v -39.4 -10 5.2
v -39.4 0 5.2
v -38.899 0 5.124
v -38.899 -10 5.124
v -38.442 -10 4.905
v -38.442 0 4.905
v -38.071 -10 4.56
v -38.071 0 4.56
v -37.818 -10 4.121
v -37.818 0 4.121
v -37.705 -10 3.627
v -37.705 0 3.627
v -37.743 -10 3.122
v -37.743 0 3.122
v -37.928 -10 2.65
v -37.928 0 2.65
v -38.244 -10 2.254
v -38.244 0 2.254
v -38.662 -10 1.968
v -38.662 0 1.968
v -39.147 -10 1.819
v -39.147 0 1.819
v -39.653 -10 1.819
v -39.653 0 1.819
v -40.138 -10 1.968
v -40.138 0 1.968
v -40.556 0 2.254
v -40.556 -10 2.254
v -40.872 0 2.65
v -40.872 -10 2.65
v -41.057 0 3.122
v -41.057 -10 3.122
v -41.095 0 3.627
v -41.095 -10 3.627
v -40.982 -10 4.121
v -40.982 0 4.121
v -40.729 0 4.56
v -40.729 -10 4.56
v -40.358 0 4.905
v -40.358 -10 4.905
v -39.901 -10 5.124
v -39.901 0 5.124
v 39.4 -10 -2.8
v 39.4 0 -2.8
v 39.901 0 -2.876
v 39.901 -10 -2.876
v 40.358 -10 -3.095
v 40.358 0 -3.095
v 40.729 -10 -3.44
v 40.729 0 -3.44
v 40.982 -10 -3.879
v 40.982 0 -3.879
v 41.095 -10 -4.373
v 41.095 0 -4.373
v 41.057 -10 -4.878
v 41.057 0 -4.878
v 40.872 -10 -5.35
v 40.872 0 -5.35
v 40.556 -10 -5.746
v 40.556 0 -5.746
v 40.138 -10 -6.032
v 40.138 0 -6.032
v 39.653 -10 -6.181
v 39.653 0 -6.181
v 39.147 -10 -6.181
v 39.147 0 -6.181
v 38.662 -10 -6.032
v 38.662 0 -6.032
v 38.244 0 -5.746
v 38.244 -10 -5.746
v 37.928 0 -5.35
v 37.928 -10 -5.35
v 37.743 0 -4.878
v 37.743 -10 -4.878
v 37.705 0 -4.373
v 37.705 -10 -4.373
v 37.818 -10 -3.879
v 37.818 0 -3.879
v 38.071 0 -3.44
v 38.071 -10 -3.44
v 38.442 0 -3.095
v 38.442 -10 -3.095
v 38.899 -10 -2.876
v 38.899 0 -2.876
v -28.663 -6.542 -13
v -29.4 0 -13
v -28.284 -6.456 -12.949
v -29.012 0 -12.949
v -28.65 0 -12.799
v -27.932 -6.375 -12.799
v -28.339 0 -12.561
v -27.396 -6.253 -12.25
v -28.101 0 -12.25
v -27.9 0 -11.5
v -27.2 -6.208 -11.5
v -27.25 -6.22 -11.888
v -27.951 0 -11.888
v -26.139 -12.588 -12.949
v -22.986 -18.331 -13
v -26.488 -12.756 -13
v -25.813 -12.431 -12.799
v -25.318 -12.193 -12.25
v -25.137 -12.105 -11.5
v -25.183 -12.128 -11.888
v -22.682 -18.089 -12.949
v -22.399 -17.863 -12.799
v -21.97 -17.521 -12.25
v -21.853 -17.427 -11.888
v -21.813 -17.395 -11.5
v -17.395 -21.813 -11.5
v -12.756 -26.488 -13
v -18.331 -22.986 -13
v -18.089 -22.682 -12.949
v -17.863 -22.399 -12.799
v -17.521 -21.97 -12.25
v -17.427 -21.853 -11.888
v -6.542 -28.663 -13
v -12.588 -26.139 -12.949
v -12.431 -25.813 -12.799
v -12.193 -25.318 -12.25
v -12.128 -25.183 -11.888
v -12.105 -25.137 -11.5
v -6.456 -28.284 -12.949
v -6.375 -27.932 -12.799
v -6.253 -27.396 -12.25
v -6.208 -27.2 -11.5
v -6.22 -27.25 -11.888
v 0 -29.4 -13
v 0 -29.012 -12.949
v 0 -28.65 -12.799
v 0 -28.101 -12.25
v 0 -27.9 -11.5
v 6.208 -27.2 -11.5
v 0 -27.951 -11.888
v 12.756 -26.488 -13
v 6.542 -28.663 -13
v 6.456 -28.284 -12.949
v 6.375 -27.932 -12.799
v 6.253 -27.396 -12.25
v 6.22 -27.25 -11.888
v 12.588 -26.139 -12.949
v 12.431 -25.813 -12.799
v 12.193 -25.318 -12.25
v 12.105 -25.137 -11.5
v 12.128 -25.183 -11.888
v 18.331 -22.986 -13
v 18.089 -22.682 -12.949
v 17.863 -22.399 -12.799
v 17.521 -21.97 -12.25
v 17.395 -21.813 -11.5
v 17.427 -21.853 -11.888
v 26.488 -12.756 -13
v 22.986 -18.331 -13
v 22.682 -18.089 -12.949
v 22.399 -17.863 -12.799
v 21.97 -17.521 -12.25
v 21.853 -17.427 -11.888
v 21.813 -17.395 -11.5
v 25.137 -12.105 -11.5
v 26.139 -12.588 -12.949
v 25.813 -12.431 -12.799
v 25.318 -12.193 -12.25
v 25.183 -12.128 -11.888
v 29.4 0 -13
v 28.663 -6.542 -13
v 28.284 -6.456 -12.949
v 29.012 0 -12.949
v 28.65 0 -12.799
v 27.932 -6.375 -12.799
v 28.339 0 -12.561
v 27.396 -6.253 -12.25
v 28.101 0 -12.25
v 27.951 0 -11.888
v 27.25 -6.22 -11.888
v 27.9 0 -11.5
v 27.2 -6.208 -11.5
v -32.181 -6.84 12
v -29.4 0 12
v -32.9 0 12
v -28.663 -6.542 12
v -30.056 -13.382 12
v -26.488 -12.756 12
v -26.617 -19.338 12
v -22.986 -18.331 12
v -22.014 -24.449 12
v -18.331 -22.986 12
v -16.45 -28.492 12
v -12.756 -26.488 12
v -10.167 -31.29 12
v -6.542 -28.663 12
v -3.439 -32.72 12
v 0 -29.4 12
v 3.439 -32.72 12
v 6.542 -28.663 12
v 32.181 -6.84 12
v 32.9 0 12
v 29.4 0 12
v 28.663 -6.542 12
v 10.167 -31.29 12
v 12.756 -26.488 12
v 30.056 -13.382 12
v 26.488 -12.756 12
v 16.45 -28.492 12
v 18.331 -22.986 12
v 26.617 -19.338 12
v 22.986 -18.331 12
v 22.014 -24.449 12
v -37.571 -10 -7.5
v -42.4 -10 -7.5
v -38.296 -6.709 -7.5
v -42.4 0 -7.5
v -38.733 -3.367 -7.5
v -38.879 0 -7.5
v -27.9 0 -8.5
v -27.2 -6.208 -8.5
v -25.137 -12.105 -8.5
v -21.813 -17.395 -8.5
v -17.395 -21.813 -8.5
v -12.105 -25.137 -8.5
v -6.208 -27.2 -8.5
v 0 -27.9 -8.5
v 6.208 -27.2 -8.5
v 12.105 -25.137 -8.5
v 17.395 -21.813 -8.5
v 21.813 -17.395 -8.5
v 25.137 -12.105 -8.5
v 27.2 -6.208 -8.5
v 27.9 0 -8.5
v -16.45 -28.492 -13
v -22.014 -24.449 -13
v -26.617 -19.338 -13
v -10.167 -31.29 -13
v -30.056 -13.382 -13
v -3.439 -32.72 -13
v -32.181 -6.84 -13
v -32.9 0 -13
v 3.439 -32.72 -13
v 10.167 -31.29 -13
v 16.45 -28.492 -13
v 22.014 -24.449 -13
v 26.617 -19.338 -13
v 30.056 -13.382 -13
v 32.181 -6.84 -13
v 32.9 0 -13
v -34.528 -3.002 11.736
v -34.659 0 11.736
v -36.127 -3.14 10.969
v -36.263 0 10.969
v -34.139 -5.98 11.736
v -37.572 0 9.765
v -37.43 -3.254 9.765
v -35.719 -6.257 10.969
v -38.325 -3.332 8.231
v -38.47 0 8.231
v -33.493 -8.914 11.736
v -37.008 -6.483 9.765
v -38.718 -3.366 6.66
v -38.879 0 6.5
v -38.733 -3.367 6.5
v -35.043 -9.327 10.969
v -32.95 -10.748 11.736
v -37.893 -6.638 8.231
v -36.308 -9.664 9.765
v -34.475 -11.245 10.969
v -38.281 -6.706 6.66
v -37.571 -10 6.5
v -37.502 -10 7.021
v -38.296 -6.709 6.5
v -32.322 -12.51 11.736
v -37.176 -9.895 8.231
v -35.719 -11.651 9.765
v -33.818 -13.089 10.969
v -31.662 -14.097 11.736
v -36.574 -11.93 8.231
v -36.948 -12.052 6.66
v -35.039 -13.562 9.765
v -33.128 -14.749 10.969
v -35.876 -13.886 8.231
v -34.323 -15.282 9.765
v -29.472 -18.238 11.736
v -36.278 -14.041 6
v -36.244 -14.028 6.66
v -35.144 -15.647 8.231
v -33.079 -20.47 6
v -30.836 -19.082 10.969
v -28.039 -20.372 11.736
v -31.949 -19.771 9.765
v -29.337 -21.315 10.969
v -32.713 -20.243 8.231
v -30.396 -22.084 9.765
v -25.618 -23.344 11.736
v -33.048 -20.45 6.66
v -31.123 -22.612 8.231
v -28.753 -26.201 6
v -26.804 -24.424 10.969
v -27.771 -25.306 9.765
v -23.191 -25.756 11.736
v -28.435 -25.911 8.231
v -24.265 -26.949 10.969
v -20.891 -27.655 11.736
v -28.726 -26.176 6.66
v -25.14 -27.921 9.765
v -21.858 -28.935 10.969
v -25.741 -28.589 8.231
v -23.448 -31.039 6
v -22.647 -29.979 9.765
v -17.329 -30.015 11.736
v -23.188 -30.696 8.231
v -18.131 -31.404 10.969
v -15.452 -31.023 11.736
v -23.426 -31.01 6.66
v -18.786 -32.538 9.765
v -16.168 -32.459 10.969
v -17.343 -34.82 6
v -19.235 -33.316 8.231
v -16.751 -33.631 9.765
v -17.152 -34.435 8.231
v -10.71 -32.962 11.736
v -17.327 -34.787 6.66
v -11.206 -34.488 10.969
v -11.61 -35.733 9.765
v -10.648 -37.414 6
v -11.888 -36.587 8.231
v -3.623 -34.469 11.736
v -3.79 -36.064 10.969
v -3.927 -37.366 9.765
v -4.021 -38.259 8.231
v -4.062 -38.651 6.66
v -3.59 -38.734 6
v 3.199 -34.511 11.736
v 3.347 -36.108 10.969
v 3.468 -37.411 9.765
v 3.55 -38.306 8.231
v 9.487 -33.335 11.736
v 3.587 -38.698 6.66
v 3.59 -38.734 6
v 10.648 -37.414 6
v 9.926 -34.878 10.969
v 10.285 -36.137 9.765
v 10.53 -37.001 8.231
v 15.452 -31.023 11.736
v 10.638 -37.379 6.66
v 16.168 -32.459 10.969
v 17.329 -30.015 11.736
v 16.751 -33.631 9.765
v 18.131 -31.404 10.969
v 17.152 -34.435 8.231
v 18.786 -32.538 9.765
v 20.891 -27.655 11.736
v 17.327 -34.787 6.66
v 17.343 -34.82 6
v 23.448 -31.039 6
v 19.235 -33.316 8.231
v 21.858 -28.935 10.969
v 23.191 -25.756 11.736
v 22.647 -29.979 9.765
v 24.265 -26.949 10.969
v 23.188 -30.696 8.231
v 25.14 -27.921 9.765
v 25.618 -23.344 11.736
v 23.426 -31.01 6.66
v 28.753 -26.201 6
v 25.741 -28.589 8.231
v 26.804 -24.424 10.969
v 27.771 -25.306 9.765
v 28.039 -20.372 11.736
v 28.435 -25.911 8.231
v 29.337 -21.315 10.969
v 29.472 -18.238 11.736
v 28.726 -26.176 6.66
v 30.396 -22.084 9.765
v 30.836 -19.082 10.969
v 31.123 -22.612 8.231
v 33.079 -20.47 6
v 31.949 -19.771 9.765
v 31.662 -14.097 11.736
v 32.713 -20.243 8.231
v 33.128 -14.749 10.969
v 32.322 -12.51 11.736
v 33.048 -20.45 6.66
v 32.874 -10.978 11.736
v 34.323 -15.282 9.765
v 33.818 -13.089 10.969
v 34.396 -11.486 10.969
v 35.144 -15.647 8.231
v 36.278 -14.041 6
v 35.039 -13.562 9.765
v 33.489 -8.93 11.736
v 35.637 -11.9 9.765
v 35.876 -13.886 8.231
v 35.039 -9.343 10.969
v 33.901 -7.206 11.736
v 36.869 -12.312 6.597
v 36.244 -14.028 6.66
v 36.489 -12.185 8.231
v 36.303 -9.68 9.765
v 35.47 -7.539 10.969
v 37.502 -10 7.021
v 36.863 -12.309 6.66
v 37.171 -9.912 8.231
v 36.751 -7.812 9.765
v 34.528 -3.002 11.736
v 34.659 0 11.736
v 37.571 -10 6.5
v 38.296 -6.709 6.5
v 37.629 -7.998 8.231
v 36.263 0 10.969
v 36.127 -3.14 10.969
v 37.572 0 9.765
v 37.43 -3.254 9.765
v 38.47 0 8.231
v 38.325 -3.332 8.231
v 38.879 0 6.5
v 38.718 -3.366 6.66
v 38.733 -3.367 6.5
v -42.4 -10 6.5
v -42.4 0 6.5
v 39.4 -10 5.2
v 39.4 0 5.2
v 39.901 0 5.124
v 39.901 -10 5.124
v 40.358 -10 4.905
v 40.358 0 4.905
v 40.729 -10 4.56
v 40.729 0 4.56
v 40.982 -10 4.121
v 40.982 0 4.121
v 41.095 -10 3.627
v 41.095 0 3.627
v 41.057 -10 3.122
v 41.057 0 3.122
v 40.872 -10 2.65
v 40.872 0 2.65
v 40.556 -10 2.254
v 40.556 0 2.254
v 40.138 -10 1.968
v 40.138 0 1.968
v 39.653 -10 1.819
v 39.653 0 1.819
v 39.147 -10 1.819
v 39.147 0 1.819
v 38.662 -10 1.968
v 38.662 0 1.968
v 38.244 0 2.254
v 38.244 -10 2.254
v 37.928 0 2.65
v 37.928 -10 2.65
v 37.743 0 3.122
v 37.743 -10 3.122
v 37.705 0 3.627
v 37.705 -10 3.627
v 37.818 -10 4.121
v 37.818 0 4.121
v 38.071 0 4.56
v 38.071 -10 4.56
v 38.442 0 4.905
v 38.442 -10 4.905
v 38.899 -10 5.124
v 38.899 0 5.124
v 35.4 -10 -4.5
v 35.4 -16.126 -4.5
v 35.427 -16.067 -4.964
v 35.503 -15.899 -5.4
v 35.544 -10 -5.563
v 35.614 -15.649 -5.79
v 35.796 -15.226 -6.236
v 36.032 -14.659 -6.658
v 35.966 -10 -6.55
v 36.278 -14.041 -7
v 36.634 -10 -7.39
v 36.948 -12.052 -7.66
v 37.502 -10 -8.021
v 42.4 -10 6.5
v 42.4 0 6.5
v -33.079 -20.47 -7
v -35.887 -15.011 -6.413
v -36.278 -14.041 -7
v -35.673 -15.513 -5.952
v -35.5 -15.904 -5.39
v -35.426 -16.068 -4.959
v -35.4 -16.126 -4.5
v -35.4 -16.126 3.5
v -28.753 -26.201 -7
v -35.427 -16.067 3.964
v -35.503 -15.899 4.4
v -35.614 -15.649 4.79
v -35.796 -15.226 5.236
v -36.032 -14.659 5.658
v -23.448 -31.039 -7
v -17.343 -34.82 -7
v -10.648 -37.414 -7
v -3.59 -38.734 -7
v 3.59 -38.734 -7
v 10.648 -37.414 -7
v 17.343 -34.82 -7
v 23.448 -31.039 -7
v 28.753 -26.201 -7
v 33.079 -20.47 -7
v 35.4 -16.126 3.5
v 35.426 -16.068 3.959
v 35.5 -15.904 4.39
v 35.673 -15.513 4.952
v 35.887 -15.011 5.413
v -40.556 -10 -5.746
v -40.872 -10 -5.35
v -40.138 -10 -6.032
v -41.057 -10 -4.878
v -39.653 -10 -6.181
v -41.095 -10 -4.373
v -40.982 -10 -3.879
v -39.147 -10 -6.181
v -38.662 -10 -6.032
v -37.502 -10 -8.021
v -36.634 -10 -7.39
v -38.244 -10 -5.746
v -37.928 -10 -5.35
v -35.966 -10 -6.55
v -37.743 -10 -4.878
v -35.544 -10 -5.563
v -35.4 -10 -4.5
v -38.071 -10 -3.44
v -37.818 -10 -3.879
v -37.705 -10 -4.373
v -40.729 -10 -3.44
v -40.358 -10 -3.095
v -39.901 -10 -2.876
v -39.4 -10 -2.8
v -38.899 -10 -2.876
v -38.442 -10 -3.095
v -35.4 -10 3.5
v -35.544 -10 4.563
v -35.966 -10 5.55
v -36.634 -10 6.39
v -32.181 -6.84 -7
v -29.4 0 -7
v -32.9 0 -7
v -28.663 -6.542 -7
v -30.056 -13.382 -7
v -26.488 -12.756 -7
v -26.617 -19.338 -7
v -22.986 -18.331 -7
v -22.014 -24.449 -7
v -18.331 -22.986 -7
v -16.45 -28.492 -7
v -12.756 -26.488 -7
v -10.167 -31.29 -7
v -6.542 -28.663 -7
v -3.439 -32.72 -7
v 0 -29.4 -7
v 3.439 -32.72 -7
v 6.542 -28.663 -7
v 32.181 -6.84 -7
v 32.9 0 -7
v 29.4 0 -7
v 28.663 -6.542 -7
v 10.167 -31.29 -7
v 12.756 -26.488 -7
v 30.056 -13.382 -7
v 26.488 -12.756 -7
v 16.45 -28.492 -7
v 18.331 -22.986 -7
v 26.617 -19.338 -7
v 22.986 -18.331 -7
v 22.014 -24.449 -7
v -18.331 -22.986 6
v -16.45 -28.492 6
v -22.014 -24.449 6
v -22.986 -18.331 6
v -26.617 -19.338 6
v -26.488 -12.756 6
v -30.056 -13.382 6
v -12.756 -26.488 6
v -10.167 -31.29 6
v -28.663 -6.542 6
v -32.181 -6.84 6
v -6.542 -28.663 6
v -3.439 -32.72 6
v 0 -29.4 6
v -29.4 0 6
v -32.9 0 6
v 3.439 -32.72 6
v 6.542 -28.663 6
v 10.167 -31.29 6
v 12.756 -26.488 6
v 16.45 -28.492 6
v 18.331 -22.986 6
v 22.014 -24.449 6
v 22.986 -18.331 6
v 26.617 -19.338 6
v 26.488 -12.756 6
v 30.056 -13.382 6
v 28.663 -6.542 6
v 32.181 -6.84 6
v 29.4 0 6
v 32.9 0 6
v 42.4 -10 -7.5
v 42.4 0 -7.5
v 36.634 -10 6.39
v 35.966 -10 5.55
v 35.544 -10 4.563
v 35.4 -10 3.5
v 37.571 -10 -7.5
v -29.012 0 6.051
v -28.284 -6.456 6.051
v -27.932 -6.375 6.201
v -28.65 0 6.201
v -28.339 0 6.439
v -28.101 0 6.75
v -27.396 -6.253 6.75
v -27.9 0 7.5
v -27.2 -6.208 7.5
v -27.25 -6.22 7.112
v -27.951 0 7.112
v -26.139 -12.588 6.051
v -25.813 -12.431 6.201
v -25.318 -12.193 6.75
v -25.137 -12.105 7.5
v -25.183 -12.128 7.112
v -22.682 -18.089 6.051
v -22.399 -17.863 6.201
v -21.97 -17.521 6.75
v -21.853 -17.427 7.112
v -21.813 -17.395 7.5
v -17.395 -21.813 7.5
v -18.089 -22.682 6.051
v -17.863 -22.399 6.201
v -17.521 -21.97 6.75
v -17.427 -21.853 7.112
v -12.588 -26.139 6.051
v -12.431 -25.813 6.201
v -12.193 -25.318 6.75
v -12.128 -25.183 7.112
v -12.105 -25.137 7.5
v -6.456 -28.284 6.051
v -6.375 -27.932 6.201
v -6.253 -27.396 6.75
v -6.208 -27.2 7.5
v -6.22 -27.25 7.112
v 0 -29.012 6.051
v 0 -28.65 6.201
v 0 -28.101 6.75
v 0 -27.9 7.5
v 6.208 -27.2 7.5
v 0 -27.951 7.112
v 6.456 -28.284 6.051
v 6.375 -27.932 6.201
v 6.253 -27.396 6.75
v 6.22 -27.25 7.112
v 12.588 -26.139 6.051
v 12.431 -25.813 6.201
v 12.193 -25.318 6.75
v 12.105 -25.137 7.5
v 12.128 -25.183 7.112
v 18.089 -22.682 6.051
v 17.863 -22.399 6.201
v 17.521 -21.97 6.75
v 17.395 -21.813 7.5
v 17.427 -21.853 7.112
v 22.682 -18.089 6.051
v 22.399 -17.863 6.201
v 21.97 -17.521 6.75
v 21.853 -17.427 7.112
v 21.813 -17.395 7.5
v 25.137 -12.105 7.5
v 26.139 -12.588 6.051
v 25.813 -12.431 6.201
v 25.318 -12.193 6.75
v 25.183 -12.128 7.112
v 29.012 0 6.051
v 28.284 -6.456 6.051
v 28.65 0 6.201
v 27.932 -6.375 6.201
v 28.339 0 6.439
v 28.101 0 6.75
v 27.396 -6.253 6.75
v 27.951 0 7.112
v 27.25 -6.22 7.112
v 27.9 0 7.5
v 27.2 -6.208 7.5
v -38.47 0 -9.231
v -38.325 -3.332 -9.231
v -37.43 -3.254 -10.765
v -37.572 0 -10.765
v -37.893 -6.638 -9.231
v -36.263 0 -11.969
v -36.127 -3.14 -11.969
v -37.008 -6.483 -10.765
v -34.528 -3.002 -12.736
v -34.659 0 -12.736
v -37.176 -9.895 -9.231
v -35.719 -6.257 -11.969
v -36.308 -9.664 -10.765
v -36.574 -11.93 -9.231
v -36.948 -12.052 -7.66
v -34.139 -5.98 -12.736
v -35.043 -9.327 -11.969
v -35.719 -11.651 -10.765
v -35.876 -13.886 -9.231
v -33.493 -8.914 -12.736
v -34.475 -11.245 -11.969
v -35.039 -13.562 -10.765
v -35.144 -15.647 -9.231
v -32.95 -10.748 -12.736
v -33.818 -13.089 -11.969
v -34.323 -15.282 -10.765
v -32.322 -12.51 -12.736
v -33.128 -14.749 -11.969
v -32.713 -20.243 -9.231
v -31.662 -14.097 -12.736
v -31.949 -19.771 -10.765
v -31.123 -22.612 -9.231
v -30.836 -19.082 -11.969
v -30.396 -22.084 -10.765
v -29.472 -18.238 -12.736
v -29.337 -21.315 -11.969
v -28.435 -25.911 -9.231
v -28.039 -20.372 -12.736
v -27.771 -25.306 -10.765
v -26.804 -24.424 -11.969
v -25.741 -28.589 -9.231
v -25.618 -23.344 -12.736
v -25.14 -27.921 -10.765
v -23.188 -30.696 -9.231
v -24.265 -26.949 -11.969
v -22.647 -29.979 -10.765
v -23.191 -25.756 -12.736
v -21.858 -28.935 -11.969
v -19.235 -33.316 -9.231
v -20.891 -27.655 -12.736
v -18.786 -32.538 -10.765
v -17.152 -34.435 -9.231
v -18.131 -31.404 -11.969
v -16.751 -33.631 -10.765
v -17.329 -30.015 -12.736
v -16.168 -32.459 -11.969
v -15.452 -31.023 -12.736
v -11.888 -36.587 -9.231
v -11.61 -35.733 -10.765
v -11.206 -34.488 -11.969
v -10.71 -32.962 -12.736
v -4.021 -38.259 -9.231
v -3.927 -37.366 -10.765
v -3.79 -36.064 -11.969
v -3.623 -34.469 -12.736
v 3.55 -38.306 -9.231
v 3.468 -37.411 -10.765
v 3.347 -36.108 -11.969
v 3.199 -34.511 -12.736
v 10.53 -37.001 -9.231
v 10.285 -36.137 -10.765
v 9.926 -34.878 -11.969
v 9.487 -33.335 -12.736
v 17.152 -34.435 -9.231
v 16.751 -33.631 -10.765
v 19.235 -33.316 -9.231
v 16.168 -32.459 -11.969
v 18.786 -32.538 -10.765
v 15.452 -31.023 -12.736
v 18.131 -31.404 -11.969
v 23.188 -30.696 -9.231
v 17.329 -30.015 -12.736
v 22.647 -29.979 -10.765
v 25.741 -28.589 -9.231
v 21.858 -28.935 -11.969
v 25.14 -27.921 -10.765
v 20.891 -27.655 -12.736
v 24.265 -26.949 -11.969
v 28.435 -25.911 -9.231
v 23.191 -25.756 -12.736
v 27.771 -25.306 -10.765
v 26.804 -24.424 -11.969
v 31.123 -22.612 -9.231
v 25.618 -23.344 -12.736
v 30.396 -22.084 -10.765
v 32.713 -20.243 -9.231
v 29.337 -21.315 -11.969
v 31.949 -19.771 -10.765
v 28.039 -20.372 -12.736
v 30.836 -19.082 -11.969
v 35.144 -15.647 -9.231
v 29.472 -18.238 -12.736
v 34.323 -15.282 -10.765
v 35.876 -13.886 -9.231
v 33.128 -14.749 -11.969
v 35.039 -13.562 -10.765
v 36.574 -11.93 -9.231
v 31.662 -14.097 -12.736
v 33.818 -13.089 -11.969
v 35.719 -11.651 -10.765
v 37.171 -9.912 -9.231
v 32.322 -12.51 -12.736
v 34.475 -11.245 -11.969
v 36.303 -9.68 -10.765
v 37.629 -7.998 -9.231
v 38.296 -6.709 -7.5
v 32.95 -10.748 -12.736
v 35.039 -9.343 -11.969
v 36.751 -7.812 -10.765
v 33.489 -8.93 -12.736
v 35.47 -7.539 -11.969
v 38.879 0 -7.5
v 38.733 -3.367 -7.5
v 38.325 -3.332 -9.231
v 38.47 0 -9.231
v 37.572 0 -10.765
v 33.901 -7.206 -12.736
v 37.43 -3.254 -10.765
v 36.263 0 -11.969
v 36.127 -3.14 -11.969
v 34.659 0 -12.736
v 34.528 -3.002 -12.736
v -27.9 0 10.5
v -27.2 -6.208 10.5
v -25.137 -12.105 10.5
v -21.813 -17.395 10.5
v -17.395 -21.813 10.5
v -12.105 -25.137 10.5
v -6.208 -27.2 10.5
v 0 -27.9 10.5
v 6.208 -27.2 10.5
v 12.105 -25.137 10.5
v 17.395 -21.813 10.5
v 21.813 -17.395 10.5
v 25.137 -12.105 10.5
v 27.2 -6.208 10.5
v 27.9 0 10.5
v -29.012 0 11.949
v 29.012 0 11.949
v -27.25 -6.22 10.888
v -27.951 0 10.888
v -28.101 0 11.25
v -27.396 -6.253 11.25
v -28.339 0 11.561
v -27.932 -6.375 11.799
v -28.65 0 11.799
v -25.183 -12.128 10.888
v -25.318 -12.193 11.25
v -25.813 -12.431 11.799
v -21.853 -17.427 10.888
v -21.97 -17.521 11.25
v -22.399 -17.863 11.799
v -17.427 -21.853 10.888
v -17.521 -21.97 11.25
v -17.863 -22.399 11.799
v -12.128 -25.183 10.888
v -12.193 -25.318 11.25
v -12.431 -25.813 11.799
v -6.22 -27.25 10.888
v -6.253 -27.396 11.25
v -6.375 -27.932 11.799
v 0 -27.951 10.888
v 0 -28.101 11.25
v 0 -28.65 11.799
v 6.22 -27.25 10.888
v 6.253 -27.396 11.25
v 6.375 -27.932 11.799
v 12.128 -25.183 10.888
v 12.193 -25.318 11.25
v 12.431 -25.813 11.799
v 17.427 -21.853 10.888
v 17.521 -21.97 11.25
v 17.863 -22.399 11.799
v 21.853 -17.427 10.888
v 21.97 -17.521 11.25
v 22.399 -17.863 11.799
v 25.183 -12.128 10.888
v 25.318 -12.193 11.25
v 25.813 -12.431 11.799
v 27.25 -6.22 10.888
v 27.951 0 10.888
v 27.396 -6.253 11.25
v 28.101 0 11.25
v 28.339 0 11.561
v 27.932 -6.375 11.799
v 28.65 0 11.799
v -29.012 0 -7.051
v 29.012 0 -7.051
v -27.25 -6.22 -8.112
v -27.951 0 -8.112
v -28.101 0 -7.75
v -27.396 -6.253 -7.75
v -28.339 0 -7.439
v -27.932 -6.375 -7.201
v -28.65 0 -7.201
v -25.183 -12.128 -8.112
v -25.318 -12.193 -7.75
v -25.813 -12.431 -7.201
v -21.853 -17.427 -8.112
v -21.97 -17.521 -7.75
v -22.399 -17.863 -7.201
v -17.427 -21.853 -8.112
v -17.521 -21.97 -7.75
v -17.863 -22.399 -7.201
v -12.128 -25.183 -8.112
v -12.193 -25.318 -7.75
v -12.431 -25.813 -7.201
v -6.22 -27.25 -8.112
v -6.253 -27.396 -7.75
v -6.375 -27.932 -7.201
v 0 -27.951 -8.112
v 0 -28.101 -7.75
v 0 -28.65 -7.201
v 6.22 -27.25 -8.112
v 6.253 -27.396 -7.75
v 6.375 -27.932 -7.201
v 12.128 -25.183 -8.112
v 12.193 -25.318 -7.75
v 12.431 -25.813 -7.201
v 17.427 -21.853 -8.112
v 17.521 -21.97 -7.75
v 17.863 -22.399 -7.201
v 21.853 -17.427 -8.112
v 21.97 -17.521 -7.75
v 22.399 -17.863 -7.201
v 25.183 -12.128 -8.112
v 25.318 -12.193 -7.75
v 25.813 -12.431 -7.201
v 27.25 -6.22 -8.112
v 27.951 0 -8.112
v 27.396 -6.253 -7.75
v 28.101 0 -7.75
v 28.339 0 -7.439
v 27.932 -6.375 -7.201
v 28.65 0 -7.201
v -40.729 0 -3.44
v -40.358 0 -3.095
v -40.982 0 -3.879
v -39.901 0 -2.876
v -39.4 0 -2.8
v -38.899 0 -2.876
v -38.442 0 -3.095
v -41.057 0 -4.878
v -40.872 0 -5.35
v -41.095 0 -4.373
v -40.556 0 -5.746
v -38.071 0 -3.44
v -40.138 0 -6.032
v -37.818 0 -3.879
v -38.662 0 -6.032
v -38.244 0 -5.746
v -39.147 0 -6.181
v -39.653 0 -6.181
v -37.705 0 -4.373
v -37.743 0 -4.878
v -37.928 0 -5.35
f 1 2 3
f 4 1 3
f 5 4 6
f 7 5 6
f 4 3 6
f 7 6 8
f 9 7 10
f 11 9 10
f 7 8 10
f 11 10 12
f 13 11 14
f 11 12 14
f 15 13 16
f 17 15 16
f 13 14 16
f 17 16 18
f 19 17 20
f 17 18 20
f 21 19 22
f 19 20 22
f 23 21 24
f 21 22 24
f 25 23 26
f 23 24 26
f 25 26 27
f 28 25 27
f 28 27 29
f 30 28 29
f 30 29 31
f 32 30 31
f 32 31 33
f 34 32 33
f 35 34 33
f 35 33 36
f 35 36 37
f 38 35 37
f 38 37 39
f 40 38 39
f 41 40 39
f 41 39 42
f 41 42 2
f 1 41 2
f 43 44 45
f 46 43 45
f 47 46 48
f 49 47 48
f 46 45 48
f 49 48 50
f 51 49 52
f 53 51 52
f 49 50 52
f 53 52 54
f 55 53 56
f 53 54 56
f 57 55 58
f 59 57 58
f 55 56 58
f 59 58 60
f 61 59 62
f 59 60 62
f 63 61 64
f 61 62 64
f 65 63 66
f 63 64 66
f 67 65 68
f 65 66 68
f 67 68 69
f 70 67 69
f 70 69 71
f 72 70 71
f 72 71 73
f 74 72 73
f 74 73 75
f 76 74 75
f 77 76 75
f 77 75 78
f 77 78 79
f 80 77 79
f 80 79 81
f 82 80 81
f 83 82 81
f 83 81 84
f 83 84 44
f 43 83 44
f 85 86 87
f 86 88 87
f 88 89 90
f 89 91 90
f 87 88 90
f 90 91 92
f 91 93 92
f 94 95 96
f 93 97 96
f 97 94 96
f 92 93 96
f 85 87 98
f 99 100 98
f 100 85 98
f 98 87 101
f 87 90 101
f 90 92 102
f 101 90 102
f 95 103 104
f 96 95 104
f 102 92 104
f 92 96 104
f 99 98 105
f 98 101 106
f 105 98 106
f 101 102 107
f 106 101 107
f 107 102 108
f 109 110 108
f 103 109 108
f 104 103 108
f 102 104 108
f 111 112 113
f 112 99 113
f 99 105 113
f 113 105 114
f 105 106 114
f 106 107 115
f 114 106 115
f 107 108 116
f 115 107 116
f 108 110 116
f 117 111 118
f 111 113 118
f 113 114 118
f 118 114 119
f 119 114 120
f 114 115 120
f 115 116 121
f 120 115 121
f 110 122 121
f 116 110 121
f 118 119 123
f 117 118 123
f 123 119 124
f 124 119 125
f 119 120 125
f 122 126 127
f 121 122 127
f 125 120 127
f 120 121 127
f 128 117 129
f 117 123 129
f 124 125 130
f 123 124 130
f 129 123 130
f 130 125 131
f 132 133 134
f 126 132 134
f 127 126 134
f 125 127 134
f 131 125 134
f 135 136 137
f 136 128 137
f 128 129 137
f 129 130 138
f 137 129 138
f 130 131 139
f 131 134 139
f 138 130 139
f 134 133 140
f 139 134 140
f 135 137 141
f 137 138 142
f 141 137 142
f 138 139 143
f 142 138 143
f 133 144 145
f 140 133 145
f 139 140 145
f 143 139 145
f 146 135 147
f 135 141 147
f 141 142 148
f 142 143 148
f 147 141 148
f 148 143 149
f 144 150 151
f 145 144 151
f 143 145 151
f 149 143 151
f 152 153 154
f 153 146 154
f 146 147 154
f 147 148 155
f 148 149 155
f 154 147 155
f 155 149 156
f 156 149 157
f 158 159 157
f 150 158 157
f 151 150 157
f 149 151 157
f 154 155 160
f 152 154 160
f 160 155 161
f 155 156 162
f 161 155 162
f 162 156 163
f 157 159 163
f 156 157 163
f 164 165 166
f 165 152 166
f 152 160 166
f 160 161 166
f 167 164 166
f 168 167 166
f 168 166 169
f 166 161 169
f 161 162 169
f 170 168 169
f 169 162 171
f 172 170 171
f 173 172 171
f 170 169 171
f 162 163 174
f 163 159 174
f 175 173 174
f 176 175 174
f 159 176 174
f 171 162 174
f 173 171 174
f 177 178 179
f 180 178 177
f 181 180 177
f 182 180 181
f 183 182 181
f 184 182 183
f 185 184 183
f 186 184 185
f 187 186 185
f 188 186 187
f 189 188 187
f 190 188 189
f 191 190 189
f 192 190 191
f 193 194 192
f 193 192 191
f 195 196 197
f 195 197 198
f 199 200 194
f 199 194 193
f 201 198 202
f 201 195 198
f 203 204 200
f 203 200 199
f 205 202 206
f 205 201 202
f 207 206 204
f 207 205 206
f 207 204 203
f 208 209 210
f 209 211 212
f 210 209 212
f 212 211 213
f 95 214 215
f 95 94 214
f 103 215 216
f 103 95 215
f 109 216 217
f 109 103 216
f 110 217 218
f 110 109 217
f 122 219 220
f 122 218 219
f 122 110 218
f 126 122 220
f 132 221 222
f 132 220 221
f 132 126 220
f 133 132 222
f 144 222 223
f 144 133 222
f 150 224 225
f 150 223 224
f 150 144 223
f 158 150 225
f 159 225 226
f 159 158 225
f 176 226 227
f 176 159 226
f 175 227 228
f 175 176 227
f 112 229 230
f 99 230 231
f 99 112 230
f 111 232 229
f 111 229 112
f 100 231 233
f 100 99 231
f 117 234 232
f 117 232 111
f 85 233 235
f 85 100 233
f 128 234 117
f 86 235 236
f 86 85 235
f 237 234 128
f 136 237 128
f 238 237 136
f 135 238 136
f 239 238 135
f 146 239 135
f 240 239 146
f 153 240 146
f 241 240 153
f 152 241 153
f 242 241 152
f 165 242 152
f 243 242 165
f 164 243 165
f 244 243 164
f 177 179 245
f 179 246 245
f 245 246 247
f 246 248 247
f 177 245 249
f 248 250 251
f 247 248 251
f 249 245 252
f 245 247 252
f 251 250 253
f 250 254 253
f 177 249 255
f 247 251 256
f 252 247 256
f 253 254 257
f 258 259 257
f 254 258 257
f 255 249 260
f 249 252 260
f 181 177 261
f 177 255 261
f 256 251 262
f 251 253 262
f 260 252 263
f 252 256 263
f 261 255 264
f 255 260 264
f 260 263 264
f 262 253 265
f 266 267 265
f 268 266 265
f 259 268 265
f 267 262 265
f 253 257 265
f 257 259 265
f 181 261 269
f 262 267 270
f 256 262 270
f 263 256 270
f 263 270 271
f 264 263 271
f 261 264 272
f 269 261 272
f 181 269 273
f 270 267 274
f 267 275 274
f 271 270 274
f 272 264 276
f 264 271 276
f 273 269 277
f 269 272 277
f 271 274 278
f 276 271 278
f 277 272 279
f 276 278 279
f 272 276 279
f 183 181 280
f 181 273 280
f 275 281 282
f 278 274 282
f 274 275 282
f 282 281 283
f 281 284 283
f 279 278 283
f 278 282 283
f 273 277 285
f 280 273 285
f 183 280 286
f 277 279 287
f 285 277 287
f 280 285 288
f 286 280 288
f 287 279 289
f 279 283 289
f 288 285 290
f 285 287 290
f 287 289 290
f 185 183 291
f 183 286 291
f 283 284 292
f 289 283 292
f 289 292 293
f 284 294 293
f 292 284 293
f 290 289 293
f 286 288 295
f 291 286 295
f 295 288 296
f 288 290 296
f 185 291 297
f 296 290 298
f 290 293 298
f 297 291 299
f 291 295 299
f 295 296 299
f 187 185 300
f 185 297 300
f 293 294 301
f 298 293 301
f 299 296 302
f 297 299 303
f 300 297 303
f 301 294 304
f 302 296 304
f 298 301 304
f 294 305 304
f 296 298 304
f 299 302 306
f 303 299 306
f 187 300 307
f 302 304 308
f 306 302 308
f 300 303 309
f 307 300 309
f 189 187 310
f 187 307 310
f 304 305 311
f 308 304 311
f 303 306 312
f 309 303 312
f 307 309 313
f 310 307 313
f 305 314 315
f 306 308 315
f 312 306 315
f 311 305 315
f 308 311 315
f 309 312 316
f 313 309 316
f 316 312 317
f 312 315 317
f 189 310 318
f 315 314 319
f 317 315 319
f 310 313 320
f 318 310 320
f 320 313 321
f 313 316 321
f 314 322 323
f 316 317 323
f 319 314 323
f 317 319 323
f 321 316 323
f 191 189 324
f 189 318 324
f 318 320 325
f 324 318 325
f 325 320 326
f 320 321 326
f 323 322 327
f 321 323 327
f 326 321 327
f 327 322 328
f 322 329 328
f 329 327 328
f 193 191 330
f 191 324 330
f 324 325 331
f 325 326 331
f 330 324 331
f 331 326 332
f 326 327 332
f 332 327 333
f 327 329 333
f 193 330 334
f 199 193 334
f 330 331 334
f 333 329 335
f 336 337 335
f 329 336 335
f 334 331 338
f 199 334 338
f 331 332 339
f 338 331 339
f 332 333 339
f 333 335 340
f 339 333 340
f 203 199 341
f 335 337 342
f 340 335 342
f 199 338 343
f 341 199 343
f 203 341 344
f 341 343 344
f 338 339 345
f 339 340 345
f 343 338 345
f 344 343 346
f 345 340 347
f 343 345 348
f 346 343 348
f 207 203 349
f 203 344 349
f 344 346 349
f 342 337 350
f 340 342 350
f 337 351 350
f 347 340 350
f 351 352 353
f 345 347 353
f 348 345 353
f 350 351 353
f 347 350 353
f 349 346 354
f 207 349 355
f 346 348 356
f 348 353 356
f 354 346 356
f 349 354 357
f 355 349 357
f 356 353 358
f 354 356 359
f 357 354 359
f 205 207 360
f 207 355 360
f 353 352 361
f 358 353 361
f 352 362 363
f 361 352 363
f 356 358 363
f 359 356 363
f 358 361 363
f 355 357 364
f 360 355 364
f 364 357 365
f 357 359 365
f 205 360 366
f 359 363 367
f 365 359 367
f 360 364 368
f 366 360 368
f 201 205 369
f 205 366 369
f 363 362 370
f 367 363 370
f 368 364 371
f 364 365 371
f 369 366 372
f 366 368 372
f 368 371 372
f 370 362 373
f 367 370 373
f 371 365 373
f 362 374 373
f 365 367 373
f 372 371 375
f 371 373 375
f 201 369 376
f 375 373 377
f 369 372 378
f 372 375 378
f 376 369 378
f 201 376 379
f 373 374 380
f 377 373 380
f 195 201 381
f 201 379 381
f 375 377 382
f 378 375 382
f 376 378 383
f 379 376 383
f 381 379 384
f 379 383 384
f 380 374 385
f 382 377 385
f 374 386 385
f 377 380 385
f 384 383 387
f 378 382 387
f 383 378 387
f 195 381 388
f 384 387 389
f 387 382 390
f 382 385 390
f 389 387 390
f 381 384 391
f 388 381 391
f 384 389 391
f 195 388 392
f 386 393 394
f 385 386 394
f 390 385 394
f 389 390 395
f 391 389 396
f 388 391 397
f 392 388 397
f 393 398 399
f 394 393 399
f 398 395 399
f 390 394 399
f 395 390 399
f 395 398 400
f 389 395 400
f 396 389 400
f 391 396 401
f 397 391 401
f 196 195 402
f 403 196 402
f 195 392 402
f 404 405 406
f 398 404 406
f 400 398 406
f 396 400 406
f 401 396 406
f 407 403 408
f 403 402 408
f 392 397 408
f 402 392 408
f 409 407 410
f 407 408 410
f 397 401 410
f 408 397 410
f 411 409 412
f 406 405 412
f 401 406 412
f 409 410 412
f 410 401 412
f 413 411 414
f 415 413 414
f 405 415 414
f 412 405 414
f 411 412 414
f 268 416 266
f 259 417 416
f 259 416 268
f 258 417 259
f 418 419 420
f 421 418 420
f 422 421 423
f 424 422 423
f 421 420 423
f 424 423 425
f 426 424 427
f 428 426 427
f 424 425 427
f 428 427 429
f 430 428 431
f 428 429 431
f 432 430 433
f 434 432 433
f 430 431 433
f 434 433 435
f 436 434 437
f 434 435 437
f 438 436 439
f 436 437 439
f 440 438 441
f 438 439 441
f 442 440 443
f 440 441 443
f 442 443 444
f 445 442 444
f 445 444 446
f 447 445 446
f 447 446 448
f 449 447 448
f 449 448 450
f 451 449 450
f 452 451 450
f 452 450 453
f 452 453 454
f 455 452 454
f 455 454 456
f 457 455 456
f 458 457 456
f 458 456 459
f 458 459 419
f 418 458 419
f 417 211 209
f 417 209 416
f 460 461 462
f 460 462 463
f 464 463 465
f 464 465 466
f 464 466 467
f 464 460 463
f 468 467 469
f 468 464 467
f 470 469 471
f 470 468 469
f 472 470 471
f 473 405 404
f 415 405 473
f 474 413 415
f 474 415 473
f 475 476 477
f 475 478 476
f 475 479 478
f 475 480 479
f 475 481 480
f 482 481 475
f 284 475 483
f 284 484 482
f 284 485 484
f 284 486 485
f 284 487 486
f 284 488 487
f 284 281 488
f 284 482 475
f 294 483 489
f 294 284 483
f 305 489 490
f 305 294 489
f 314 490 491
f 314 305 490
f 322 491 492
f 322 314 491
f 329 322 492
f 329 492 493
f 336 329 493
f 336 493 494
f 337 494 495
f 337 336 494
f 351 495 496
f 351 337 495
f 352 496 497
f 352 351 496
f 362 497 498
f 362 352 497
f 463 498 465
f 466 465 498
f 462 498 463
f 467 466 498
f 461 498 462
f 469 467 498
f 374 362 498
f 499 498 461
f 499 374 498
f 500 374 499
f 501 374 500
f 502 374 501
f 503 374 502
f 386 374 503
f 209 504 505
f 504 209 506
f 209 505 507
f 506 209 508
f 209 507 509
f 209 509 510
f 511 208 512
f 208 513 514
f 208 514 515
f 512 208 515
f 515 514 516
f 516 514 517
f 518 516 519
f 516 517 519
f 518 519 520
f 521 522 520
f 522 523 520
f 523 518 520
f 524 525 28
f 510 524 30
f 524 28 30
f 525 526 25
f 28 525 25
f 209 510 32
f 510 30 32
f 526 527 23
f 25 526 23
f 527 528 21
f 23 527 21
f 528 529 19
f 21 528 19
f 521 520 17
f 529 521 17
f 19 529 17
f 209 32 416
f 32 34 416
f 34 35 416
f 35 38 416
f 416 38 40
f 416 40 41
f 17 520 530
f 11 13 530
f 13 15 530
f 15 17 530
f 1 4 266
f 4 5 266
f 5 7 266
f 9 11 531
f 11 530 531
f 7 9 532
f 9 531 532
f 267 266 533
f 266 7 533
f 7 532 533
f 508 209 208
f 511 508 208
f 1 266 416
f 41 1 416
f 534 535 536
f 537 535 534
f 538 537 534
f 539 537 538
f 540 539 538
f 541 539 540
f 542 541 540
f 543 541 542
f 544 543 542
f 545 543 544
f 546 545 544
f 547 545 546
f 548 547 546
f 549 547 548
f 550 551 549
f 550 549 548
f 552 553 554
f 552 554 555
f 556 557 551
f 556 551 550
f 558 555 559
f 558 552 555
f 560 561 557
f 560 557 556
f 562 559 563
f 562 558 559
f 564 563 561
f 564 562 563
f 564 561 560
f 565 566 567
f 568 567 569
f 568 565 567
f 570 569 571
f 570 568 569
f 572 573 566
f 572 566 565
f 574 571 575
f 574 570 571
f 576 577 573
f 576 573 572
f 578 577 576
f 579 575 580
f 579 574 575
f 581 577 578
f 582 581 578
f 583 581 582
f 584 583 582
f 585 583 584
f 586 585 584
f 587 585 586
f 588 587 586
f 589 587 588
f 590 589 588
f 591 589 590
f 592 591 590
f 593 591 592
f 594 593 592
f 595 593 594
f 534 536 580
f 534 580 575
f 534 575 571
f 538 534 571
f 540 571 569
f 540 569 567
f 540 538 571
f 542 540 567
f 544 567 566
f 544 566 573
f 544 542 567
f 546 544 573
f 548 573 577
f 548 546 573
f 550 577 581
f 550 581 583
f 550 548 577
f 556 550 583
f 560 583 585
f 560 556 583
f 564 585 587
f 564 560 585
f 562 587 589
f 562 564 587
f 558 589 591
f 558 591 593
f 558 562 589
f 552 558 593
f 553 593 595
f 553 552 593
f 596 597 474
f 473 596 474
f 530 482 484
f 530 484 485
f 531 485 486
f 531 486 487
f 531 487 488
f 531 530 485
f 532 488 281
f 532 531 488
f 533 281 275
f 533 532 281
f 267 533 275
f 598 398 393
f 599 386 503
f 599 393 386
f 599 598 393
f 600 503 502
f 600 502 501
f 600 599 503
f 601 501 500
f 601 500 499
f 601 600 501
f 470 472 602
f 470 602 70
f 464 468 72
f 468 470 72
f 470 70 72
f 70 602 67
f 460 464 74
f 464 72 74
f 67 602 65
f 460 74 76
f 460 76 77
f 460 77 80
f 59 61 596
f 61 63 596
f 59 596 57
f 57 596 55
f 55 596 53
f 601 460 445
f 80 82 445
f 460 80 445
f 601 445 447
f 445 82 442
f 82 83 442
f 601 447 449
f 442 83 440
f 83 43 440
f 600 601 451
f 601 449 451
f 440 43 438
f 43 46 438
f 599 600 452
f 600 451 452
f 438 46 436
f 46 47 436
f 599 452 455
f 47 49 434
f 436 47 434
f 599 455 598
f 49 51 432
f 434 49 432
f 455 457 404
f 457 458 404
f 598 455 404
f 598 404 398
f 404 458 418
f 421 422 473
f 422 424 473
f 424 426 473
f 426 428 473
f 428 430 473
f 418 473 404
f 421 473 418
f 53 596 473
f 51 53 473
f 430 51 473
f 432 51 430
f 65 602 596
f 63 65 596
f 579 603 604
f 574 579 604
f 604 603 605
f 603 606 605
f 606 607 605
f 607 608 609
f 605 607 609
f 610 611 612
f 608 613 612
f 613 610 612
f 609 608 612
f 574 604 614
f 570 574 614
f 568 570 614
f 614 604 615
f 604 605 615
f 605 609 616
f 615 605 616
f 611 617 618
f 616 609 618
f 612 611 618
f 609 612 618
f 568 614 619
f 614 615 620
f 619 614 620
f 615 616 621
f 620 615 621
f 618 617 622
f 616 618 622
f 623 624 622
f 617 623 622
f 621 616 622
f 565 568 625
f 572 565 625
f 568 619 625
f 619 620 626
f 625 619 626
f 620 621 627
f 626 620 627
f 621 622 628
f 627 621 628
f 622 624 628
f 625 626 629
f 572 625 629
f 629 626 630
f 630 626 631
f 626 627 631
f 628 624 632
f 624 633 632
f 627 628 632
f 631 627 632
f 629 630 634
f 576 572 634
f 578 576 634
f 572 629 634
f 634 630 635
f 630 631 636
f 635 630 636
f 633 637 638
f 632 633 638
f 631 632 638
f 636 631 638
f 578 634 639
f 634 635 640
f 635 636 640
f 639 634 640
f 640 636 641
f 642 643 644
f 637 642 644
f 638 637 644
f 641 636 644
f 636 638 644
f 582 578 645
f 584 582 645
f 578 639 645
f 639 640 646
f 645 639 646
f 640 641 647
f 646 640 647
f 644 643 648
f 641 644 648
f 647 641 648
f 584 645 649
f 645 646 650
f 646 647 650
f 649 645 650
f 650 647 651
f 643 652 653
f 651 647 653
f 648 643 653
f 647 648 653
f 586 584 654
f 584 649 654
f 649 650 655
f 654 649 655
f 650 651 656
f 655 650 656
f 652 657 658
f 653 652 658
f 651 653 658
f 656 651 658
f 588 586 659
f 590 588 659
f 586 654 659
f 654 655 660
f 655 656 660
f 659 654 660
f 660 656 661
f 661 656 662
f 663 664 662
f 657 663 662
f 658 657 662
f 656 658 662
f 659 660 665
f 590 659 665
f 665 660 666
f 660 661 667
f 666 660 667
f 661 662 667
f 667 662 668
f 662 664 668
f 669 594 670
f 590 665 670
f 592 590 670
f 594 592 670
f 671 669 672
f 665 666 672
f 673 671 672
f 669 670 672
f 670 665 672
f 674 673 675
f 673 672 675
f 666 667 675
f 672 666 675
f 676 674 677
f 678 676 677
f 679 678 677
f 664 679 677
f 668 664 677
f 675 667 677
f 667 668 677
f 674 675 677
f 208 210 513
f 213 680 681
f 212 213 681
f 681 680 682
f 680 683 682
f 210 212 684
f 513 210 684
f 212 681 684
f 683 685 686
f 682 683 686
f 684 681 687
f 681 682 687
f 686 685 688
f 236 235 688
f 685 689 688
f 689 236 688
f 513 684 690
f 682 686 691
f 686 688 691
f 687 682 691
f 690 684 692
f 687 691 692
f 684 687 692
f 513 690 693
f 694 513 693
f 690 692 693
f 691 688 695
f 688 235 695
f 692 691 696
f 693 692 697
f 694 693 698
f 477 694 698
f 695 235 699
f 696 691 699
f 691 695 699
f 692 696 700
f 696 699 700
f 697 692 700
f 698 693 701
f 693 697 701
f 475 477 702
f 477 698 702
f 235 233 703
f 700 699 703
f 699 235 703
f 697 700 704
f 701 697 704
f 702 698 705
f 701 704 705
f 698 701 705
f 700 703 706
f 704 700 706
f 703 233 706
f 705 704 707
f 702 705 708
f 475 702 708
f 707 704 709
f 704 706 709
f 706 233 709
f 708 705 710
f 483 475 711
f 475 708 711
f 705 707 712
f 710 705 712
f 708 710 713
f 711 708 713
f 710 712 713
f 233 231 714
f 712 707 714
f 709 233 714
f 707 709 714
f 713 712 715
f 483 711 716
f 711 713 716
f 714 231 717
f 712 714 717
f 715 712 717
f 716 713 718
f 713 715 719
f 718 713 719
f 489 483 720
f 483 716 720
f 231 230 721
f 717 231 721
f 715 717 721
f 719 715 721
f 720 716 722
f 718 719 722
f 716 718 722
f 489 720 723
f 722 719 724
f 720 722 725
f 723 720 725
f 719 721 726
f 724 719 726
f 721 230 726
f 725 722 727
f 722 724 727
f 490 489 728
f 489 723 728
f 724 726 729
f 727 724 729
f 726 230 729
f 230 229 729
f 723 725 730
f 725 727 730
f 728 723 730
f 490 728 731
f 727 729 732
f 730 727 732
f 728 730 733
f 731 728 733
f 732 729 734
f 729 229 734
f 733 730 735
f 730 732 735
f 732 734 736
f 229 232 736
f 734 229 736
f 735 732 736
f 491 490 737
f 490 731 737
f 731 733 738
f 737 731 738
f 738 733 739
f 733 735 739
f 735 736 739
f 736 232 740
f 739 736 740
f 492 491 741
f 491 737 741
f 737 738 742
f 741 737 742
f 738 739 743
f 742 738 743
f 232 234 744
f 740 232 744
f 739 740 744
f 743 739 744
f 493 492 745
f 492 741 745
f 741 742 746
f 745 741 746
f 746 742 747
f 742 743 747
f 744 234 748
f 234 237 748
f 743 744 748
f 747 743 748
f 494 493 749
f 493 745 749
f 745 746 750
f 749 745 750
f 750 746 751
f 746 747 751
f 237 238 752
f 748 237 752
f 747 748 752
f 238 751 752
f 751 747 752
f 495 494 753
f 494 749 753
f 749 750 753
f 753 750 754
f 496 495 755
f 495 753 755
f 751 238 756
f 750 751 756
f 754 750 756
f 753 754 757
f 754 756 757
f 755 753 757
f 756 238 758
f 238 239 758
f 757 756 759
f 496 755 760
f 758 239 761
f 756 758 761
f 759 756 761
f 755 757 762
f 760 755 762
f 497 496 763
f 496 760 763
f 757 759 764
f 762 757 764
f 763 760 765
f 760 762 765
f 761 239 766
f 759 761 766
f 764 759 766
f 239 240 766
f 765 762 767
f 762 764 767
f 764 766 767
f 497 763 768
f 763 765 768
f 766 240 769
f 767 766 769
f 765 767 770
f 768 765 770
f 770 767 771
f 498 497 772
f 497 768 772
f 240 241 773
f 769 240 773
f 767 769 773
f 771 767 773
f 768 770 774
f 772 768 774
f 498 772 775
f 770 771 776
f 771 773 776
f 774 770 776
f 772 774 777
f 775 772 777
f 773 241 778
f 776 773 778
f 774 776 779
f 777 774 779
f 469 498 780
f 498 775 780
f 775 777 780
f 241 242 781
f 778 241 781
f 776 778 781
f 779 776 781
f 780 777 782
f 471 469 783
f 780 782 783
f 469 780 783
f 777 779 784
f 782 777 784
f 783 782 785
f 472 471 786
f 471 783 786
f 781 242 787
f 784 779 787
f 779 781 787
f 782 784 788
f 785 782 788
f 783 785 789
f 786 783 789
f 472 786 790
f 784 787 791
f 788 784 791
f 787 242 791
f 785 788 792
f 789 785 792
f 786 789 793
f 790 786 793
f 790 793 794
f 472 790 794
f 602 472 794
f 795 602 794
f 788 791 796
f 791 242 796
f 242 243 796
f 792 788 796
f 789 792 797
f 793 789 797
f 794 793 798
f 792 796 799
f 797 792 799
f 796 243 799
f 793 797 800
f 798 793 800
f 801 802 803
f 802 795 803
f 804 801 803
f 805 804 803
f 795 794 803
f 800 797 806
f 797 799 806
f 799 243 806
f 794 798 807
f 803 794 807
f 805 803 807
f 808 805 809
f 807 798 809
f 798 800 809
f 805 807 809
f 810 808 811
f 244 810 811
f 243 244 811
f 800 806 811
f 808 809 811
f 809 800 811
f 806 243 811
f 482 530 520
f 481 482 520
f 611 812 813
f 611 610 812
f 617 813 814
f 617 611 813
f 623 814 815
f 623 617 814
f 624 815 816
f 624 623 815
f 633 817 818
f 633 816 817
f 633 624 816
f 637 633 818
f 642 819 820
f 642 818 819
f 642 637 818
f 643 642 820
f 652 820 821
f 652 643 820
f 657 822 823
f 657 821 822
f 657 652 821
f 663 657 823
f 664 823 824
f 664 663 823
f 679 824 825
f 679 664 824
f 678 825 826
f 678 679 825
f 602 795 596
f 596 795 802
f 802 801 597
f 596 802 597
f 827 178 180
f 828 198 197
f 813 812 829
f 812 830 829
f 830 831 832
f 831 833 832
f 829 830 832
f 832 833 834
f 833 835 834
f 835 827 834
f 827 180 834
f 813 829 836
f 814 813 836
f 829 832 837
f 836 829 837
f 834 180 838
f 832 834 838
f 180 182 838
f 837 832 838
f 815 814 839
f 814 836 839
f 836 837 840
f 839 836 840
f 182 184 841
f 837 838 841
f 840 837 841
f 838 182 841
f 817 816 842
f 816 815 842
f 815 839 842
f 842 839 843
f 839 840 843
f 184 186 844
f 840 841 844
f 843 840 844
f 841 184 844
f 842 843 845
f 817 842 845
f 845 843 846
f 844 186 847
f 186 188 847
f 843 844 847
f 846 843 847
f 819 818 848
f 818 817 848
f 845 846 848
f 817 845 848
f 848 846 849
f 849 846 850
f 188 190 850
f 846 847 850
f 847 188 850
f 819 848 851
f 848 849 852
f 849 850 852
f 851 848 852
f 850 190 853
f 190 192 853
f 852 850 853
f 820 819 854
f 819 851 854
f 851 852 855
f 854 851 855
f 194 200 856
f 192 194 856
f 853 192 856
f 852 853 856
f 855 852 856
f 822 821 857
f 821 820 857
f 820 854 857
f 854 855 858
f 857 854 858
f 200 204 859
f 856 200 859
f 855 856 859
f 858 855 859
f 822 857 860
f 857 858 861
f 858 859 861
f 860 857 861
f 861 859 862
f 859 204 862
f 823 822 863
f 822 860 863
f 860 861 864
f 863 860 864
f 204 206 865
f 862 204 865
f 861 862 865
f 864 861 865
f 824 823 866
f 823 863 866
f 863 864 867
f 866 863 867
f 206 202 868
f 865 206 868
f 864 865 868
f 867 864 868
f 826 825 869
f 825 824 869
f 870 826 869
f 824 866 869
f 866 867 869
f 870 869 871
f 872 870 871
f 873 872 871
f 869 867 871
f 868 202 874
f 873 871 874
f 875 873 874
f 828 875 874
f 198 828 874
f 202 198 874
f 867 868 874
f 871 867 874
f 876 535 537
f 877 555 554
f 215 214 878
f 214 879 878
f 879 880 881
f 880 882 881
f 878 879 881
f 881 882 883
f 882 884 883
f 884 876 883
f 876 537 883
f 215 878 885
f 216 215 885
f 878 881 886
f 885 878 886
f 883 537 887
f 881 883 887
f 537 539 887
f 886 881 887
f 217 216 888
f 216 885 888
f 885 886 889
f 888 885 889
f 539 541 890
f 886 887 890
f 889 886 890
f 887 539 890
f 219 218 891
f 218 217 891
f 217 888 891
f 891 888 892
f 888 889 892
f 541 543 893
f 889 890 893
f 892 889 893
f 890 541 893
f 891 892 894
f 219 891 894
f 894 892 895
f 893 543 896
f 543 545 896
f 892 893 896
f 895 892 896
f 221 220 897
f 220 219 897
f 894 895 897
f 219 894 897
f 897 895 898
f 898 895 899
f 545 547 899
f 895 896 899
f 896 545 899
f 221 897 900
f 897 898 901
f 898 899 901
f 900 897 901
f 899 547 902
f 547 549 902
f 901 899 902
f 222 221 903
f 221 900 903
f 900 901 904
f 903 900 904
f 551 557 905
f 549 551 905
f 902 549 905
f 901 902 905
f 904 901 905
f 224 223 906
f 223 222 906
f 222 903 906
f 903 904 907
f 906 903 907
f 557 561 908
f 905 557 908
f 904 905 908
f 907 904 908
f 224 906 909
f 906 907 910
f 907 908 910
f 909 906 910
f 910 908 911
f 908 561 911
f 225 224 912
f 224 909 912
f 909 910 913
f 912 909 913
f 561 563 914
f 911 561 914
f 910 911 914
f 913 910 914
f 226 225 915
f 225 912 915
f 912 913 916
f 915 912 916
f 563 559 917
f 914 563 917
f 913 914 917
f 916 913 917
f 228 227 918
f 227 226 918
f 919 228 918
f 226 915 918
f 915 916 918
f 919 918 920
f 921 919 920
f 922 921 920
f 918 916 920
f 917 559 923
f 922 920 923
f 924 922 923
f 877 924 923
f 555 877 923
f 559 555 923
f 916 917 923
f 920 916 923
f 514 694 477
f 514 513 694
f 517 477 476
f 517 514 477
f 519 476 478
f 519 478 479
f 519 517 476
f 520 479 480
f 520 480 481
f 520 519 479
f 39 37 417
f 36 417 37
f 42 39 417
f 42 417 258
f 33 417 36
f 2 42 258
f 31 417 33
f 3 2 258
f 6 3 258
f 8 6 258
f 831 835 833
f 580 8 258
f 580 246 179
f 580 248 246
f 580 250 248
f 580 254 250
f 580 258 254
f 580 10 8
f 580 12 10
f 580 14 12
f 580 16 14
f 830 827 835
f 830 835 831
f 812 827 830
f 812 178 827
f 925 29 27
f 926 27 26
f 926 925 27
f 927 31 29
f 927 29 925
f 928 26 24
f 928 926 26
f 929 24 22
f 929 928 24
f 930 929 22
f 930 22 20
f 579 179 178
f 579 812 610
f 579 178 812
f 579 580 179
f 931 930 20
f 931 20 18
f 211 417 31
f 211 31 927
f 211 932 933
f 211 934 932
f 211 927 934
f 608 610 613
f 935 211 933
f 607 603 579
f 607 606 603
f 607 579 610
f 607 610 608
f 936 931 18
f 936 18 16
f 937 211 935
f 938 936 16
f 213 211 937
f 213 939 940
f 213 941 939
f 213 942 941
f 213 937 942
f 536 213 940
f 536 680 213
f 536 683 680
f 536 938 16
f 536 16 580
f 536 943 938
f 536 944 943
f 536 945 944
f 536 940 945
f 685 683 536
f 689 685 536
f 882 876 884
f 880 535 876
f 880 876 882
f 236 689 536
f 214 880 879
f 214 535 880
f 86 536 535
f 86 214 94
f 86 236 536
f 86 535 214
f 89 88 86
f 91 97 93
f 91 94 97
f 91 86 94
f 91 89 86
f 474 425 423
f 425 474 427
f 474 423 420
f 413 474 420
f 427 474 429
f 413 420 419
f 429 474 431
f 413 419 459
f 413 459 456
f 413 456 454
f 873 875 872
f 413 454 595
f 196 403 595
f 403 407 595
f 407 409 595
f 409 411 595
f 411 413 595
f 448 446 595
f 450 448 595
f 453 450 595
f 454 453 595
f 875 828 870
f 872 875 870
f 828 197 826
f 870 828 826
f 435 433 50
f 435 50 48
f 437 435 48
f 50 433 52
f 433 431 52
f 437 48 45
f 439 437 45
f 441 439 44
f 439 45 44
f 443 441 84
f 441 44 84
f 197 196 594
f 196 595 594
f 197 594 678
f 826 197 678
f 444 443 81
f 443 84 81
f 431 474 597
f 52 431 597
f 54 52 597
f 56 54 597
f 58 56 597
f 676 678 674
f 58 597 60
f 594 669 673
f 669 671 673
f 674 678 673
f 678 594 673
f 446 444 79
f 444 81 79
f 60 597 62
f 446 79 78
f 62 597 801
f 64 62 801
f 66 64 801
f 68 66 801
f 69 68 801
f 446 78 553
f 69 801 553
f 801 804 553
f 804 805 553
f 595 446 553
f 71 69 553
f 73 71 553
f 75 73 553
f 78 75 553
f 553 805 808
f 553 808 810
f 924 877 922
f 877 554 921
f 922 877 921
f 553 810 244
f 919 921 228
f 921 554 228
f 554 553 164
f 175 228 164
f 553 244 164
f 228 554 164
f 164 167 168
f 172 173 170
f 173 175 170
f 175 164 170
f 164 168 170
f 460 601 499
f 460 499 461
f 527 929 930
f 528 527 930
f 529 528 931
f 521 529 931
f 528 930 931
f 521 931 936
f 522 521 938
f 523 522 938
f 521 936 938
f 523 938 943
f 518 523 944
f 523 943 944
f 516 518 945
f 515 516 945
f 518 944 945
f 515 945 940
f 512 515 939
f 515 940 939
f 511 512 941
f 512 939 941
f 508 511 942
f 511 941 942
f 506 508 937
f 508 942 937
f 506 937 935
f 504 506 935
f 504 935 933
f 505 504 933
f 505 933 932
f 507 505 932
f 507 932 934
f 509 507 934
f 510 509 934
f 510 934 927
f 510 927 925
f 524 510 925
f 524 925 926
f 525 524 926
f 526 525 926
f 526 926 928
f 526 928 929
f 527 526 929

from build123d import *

# Parameters (mm, degrees)
REVOLUTION007_ANGLE     = 180
SKETCH064_W             = 14
SKETCH064_H             = 6
PAD026_DEPTH            = 10
SKETCH063_R             = 1.7
POCKET007_DEPTH         = 38.901
POCKET008_DEPTH         = 28.901
BODY015_PLACEMENT_ANGLE = 180


with BuildPart() as part:
    # Sketch062 → Revolution007 (revolve, symmetric)
    with BuildSketch(Plane.YZ) as revolution007_sk:
        with BuildLine():
            Line((32.9, 0), (32.9, 6.5))
            Line((32.9, 6.5), (29.4, 6.5))
            ThreePointArc((27.9, 8), (28.33934, 6.93934), (29.4, 6.5))
            Line((27.9, 8), (27.9, 11))
            ThreePointArc((29.4, 12.5), (28.33934, 12.06066), (27.9, 11))
            Line((29.4, 12.5), (32.9, 12.5))
            ThreePointArc((38.9, 6.5), (37.142641, 10.742641), (32.9, 12.5))
            Line((38.9, 6.5), (38.9, 0))
            Line((38.9, 0), (38.9, -6.5))
            ThreePointArc((32.9, -12.5), (37.142641, -10.742641), (38.9, -6.5))
            Line((32.9, -12.5), (29.4, -12.5))
            ThreePointArc((27.9, -11), (28.33934, -12.06066), (29.4, -12.5))
            Line((27.9, -11), (27.9, -8))
            ThreePointArc((29.4, -6.5), (28.33934, -6.93934), (27.9, -8))
            Line((29.4, -6.5), (32.9, -6.5))
            Line((32.9, -6.5), (32.9, 0))
        make_face()
    revolve(axis=Axis((0, 0, 0), (0, 0, 1)), revolution_arc=REVOLUTION007_ANGLE / 2)
    revolve(revolution007_sk.sketch, axis=Axis((0, 0, 0), (0, 0, -1)), revolution_arc=REVOLUTION007_ANGLE / 2)

    # Sketch064 (on Face18 of Revolution007) → Pad026 (new body)
    with BuildSketch(Plane(origin=(0, 0, 0), x_dir=(0, 0, -1), z_dir=(0, -1, 0))):
        with Locations((0, 39.4)):
            Rectangle(SKETCH064_W, SKETCH064_H)
        with Locations((0, -39.4)):
            Rectangle(SKETCH064_W, SKETCH064_H)
    extrude(amount=-PAD026_DEPTH)

    # Sketch063 (on Face18 of Revolution007) → Pocket007 (cut, through all)
    with BuildSketch(Plane(origin=(0, 0, 0), x_dir=(0, 0, -1), z_dir=(0, -1, 0))):
        with Locations((4, 39.4)):
            Circle(SKETCH063_R)
        with Locations((-4, 39.4)):
            Circle(SKETCH063_R)
        with Locations((-4, -39.4)):
            Circle(SKETCH063_R)
        with Locations((4, -39.4)):
            Circle(SKETCH063_R)
    extrude(amount=-POCKET007_DEPTH, mode=Mode.SUBTRACT)

    # Sketch065 (on Face22 of Pocket007) → Pocket008 (cut, through all)
    with BuildSketch(Plane.ZX.offset(10)):
        with BuildLine():
            Line((-4, 43.4), (4.000001, 43.4))
            ThreePointArc((4.000001, 35.4), (8, 39.4), (4.000001, 43.4))
            Line((-4, 35.4), (4.000001, 35.4))
            ThreePointArc((-4, 43.4), (-8, 39.4), (-4, 35.4))
        make_face()
        with BuildLine():
            Line((-4, -35.4), (4, -35.4))
            ThreePointArc((4, -43.4), (8, -39.4), (4, -35.4))
            Line((-4, -43.4), (4, -43.4))
            ThreePointArc((-4, -35.4), (-8, -39.4), (-4, -43.4))
        make_face()
    extrude(amount=POCKET008_DEPTH, mode=Mode.SUBTRACT)


with BuildPart() as part_1:
    # Body015 placement: moved
    add(part.part.moved(Location((0, 0, -0.5))).rotate(Axis((0, 0, -0.5), (1, 0, 0)), BODY015_PLACEMENT_ANGLE))


solid = part_1.part
